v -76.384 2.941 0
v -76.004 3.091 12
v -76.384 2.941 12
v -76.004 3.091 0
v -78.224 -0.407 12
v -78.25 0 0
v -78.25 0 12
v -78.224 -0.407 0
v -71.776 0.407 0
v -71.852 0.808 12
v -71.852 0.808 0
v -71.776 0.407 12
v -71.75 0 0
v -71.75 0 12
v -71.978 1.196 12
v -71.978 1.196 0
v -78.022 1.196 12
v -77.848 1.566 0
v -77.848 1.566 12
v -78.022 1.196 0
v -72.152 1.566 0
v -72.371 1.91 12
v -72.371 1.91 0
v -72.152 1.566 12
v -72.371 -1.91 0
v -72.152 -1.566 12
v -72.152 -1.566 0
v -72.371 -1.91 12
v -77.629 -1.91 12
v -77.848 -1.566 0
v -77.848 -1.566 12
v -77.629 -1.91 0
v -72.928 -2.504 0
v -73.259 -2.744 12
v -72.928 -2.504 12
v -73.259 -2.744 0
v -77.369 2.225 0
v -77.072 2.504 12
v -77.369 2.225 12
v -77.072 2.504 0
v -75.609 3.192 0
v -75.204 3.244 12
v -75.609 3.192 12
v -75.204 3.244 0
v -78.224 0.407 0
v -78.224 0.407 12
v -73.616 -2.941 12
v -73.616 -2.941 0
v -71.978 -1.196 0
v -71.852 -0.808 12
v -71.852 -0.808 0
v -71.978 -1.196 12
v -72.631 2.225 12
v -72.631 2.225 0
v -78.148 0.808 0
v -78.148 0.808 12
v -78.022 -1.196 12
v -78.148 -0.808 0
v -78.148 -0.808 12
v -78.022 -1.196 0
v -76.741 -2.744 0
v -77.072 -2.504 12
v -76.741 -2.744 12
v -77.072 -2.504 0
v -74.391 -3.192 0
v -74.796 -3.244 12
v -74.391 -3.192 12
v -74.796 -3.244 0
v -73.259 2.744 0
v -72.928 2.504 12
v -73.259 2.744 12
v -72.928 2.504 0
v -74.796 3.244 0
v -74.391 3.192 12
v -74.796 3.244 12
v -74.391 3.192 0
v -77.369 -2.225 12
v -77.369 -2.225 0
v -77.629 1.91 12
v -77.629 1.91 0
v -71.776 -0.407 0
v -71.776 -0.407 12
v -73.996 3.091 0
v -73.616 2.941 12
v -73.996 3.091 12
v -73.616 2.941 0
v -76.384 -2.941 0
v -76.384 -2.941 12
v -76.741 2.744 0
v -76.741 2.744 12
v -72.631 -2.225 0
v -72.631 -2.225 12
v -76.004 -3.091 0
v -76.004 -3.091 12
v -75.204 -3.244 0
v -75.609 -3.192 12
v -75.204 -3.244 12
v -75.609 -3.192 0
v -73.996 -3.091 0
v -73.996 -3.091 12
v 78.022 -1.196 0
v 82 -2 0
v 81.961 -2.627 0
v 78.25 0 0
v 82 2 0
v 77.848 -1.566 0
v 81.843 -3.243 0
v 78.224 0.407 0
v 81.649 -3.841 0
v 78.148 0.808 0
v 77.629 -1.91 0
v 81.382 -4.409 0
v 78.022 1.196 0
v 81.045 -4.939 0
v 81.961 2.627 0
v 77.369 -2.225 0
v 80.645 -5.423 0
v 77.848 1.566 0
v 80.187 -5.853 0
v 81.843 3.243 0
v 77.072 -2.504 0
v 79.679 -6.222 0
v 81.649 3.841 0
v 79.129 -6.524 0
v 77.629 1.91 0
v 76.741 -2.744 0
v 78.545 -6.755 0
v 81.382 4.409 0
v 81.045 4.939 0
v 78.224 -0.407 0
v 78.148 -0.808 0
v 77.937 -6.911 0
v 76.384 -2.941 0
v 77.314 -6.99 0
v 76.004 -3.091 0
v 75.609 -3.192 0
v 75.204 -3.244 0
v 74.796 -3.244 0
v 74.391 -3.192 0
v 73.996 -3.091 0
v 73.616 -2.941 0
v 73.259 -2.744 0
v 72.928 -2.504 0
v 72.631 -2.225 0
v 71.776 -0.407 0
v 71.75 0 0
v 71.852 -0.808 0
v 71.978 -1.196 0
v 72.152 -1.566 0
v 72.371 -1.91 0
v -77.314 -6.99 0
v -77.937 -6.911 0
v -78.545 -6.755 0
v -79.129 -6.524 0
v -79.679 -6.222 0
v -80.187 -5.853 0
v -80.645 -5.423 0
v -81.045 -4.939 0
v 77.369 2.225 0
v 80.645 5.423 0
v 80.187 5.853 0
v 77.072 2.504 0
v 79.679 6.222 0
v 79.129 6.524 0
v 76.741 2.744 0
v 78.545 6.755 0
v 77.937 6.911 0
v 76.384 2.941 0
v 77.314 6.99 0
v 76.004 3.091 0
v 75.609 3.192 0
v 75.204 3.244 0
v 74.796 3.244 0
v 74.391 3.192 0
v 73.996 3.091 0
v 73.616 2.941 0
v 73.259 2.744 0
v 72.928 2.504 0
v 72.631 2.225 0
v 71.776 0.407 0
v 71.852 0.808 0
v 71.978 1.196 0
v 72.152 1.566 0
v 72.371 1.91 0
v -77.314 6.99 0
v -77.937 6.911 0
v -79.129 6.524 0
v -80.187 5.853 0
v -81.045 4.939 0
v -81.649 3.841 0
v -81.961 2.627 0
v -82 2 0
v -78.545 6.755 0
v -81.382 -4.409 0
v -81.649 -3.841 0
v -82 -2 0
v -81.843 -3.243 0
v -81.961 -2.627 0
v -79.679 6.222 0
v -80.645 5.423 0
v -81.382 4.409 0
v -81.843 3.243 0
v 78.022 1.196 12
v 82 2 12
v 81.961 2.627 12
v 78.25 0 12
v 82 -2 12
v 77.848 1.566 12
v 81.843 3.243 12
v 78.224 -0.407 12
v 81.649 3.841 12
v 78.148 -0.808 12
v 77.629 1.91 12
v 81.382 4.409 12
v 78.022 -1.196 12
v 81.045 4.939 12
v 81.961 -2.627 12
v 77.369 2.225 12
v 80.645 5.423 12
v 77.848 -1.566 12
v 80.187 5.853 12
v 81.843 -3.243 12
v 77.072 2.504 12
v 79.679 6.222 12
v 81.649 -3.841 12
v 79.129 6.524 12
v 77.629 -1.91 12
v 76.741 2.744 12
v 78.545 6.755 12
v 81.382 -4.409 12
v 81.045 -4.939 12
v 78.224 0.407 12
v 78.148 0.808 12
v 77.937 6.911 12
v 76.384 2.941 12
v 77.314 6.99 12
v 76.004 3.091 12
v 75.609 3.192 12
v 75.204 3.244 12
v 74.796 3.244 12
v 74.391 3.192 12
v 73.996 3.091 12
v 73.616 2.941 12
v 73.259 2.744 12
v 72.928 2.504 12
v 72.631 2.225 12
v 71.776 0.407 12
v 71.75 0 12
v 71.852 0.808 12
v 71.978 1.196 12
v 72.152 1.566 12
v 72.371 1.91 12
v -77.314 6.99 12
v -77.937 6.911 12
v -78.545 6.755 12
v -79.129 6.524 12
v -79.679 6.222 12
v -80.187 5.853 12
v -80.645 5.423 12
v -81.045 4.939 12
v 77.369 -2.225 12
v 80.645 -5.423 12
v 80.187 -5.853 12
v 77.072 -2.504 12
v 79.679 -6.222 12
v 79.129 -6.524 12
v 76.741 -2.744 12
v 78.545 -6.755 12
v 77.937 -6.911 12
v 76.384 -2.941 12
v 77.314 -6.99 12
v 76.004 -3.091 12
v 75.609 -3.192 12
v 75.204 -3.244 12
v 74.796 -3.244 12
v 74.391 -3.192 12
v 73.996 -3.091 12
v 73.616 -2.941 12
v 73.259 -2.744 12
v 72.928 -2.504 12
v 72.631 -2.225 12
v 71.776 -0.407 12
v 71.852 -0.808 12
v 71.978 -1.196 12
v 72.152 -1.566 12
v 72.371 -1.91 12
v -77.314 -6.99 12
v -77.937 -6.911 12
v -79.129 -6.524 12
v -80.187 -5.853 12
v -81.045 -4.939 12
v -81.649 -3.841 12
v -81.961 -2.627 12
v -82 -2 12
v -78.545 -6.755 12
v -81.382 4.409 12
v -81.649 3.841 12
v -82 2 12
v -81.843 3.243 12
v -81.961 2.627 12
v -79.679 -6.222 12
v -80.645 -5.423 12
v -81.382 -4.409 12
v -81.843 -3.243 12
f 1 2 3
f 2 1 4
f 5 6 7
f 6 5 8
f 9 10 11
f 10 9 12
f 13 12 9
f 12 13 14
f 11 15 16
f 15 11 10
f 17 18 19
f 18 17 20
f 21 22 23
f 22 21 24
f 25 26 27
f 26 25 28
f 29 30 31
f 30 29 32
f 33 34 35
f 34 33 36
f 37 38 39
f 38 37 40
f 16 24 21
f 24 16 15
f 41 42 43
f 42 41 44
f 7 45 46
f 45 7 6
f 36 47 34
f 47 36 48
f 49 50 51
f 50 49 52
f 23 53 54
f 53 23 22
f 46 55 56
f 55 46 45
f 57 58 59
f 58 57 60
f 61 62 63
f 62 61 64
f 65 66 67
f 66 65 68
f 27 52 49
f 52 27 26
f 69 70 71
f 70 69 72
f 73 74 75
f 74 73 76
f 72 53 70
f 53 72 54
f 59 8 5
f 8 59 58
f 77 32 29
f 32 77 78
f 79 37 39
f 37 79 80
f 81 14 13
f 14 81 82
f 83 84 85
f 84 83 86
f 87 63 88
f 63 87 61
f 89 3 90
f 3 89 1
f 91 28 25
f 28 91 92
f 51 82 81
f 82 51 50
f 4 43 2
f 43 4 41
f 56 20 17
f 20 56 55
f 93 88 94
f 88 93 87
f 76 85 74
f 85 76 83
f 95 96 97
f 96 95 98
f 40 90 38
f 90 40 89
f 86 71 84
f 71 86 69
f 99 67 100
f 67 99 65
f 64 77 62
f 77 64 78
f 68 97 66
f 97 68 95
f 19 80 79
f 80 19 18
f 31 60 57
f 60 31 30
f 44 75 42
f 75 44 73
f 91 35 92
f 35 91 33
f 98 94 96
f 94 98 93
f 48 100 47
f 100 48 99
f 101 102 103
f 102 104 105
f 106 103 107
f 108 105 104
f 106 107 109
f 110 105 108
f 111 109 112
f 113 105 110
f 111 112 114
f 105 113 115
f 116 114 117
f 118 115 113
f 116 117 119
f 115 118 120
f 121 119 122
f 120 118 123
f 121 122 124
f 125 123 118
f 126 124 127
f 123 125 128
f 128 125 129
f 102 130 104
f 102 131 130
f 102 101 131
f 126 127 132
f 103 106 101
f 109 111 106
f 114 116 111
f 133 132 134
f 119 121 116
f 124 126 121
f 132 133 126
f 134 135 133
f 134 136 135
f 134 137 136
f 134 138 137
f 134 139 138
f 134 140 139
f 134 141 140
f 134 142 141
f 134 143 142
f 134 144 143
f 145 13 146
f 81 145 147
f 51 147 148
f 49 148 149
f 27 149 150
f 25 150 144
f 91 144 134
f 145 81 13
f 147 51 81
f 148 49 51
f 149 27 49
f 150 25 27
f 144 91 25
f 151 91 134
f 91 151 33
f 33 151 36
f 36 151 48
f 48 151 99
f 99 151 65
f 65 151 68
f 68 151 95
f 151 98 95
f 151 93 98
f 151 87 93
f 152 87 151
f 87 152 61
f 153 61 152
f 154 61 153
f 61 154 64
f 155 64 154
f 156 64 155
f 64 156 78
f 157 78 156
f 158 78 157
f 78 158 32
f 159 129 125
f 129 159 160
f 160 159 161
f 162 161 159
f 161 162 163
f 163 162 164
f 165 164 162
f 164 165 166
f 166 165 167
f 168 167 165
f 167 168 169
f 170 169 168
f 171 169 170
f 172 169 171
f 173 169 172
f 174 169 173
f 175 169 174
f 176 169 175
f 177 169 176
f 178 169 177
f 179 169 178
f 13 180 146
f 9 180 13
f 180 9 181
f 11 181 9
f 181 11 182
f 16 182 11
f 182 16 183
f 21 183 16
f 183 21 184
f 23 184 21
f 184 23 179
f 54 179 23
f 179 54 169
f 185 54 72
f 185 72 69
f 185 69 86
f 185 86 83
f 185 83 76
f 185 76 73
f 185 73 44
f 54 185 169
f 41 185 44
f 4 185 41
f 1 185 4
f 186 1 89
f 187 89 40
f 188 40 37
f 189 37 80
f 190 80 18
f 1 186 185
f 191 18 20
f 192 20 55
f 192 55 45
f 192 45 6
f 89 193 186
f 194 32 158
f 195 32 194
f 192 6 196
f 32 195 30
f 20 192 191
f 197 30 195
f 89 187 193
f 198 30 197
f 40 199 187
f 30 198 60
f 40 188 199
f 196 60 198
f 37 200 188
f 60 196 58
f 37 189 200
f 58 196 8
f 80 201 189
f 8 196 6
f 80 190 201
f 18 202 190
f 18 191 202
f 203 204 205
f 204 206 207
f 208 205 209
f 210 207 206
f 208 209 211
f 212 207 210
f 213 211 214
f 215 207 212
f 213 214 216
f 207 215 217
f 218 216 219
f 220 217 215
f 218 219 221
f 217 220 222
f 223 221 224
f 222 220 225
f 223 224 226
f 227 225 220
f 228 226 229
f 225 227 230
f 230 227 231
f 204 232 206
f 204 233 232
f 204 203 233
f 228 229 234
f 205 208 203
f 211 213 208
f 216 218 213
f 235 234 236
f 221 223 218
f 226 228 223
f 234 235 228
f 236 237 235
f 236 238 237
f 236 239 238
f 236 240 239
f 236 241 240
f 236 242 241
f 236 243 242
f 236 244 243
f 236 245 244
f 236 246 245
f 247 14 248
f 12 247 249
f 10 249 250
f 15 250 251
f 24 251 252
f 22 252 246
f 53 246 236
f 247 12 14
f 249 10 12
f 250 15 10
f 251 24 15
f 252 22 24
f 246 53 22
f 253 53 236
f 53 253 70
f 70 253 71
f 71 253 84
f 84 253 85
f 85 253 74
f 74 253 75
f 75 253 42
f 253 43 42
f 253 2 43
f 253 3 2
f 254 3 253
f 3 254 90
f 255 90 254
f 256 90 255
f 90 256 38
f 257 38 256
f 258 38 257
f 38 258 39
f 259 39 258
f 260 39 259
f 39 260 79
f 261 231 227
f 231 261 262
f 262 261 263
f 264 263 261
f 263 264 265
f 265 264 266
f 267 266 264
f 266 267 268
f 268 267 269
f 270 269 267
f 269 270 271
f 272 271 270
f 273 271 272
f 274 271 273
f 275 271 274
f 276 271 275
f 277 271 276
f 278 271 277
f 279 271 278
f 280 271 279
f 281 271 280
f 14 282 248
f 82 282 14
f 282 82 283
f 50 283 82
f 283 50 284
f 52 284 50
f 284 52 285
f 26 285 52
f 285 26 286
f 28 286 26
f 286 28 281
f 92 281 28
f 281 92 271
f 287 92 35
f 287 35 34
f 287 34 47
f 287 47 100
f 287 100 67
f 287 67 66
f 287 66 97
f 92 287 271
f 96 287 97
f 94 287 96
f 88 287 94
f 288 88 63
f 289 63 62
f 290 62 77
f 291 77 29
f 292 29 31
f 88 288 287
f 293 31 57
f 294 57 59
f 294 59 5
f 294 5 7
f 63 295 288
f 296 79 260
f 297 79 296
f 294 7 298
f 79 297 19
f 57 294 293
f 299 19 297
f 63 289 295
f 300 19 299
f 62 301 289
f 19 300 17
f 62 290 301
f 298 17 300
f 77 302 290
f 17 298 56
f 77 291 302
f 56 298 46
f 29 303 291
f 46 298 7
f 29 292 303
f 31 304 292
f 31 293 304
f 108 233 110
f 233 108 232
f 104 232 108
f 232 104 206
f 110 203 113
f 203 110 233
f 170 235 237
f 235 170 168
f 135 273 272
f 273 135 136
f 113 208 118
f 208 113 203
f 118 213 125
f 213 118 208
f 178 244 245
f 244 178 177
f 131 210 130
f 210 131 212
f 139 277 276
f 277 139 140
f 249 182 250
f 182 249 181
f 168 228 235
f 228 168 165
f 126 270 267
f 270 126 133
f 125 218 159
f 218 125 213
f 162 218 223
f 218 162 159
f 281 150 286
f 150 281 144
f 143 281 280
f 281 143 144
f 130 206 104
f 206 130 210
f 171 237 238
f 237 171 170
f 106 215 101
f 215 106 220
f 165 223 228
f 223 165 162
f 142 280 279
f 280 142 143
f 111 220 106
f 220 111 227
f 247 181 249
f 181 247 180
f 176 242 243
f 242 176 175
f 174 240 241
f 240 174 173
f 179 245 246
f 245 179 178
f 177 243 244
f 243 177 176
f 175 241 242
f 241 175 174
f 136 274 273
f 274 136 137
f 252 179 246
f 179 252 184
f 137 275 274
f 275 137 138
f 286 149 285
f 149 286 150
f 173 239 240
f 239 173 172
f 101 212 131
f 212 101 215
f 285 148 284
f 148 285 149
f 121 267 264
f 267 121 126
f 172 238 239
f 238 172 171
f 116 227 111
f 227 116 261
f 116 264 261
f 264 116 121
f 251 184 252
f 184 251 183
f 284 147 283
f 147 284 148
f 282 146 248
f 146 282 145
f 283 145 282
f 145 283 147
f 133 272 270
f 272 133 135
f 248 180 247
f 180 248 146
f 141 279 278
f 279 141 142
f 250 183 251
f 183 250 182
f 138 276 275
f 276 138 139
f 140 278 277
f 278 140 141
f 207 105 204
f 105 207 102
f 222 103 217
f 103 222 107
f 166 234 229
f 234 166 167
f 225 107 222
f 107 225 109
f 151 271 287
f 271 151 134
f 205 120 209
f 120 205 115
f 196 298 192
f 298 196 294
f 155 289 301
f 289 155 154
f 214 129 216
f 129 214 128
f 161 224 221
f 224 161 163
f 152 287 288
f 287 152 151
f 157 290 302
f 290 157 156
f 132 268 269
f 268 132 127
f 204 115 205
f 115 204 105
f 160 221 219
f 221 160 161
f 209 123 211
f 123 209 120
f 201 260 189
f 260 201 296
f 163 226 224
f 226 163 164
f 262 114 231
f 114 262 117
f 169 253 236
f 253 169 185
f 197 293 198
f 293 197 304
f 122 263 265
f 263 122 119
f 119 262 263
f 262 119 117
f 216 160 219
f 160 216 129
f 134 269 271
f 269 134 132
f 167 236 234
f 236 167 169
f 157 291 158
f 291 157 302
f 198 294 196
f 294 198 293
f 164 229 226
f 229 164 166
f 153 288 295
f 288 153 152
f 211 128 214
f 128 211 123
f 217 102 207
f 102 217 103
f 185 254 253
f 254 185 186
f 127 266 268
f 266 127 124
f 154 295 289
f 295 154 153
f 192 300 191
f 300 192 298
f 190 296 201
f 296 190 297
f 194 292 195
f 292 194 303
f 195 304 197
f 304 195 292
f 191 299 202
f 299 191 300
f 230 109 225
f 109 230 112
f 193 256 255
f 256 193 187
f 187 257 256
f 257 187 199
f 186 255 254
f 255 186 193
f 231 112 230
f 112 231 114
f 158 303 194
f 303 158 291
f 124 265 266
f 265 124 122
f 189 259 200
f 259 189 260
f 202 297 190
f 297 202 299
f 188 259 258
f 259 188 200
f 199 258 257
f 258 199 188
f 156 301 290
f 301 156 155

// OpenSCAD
$fn = 50;


difference() {
	union() {
		hull() {
			translate(v = [-77.0000000000, 2.0000000000, 0]) {
				cylinder(h = 12, r = 5);
			}
			translate(v = [77.0000000000, 2.0000000000, 0]) {
				cylinder(h = 12, r = 5);
			}
			translate(v = [-77.0000000000, -2.0000000000, 0]) {
				cylinder(h = 12, r = 5);
			}
			translate(v = [77.0000000000, -2.0000000000, 0]) {
				cylinder(h = 12, r = 5);
			}
		}
	}
	union() {
		translate(v = [-75.0000000000, 0.0000000000, 0]) {
			cylinder(h = 12, r = 3.2500000000);
		}
		translate(v = [75.0000000000, 0.0000000000, 0]) {
			cylinder(h = 12, r = 3.2500000000);
		}
		translate(v = [-75.0000000000, 0.0000000000, 0]) {
			cylinder(h = 12, r = 1.8000000000);
		}
		translate(v = [75.0000000000, 0.0000000000, 0]) {
			cylinder(h = 12, r = 1.8000000000);
		}
		translate(v = [-75.0000000000, 0.0000000000, 0]) {
			cylinder(h = 12, r = 1.8000000000);
		}
		translate(v = [75.0000000000, 0.0000000000, 0]) {
			cylinder(h = 12, r = 1.8000000000);
		}
		translate(v = [-75.0000000000, 0.0000000000, 0]) {
			cylinder(h = 12, r = 1.8000000000);
		}
		translate(v = [75.0000000000, 0.0000000000, 0]) {
			cylinder(h = 12, r = 1.8000000000);
		}
	}
}
